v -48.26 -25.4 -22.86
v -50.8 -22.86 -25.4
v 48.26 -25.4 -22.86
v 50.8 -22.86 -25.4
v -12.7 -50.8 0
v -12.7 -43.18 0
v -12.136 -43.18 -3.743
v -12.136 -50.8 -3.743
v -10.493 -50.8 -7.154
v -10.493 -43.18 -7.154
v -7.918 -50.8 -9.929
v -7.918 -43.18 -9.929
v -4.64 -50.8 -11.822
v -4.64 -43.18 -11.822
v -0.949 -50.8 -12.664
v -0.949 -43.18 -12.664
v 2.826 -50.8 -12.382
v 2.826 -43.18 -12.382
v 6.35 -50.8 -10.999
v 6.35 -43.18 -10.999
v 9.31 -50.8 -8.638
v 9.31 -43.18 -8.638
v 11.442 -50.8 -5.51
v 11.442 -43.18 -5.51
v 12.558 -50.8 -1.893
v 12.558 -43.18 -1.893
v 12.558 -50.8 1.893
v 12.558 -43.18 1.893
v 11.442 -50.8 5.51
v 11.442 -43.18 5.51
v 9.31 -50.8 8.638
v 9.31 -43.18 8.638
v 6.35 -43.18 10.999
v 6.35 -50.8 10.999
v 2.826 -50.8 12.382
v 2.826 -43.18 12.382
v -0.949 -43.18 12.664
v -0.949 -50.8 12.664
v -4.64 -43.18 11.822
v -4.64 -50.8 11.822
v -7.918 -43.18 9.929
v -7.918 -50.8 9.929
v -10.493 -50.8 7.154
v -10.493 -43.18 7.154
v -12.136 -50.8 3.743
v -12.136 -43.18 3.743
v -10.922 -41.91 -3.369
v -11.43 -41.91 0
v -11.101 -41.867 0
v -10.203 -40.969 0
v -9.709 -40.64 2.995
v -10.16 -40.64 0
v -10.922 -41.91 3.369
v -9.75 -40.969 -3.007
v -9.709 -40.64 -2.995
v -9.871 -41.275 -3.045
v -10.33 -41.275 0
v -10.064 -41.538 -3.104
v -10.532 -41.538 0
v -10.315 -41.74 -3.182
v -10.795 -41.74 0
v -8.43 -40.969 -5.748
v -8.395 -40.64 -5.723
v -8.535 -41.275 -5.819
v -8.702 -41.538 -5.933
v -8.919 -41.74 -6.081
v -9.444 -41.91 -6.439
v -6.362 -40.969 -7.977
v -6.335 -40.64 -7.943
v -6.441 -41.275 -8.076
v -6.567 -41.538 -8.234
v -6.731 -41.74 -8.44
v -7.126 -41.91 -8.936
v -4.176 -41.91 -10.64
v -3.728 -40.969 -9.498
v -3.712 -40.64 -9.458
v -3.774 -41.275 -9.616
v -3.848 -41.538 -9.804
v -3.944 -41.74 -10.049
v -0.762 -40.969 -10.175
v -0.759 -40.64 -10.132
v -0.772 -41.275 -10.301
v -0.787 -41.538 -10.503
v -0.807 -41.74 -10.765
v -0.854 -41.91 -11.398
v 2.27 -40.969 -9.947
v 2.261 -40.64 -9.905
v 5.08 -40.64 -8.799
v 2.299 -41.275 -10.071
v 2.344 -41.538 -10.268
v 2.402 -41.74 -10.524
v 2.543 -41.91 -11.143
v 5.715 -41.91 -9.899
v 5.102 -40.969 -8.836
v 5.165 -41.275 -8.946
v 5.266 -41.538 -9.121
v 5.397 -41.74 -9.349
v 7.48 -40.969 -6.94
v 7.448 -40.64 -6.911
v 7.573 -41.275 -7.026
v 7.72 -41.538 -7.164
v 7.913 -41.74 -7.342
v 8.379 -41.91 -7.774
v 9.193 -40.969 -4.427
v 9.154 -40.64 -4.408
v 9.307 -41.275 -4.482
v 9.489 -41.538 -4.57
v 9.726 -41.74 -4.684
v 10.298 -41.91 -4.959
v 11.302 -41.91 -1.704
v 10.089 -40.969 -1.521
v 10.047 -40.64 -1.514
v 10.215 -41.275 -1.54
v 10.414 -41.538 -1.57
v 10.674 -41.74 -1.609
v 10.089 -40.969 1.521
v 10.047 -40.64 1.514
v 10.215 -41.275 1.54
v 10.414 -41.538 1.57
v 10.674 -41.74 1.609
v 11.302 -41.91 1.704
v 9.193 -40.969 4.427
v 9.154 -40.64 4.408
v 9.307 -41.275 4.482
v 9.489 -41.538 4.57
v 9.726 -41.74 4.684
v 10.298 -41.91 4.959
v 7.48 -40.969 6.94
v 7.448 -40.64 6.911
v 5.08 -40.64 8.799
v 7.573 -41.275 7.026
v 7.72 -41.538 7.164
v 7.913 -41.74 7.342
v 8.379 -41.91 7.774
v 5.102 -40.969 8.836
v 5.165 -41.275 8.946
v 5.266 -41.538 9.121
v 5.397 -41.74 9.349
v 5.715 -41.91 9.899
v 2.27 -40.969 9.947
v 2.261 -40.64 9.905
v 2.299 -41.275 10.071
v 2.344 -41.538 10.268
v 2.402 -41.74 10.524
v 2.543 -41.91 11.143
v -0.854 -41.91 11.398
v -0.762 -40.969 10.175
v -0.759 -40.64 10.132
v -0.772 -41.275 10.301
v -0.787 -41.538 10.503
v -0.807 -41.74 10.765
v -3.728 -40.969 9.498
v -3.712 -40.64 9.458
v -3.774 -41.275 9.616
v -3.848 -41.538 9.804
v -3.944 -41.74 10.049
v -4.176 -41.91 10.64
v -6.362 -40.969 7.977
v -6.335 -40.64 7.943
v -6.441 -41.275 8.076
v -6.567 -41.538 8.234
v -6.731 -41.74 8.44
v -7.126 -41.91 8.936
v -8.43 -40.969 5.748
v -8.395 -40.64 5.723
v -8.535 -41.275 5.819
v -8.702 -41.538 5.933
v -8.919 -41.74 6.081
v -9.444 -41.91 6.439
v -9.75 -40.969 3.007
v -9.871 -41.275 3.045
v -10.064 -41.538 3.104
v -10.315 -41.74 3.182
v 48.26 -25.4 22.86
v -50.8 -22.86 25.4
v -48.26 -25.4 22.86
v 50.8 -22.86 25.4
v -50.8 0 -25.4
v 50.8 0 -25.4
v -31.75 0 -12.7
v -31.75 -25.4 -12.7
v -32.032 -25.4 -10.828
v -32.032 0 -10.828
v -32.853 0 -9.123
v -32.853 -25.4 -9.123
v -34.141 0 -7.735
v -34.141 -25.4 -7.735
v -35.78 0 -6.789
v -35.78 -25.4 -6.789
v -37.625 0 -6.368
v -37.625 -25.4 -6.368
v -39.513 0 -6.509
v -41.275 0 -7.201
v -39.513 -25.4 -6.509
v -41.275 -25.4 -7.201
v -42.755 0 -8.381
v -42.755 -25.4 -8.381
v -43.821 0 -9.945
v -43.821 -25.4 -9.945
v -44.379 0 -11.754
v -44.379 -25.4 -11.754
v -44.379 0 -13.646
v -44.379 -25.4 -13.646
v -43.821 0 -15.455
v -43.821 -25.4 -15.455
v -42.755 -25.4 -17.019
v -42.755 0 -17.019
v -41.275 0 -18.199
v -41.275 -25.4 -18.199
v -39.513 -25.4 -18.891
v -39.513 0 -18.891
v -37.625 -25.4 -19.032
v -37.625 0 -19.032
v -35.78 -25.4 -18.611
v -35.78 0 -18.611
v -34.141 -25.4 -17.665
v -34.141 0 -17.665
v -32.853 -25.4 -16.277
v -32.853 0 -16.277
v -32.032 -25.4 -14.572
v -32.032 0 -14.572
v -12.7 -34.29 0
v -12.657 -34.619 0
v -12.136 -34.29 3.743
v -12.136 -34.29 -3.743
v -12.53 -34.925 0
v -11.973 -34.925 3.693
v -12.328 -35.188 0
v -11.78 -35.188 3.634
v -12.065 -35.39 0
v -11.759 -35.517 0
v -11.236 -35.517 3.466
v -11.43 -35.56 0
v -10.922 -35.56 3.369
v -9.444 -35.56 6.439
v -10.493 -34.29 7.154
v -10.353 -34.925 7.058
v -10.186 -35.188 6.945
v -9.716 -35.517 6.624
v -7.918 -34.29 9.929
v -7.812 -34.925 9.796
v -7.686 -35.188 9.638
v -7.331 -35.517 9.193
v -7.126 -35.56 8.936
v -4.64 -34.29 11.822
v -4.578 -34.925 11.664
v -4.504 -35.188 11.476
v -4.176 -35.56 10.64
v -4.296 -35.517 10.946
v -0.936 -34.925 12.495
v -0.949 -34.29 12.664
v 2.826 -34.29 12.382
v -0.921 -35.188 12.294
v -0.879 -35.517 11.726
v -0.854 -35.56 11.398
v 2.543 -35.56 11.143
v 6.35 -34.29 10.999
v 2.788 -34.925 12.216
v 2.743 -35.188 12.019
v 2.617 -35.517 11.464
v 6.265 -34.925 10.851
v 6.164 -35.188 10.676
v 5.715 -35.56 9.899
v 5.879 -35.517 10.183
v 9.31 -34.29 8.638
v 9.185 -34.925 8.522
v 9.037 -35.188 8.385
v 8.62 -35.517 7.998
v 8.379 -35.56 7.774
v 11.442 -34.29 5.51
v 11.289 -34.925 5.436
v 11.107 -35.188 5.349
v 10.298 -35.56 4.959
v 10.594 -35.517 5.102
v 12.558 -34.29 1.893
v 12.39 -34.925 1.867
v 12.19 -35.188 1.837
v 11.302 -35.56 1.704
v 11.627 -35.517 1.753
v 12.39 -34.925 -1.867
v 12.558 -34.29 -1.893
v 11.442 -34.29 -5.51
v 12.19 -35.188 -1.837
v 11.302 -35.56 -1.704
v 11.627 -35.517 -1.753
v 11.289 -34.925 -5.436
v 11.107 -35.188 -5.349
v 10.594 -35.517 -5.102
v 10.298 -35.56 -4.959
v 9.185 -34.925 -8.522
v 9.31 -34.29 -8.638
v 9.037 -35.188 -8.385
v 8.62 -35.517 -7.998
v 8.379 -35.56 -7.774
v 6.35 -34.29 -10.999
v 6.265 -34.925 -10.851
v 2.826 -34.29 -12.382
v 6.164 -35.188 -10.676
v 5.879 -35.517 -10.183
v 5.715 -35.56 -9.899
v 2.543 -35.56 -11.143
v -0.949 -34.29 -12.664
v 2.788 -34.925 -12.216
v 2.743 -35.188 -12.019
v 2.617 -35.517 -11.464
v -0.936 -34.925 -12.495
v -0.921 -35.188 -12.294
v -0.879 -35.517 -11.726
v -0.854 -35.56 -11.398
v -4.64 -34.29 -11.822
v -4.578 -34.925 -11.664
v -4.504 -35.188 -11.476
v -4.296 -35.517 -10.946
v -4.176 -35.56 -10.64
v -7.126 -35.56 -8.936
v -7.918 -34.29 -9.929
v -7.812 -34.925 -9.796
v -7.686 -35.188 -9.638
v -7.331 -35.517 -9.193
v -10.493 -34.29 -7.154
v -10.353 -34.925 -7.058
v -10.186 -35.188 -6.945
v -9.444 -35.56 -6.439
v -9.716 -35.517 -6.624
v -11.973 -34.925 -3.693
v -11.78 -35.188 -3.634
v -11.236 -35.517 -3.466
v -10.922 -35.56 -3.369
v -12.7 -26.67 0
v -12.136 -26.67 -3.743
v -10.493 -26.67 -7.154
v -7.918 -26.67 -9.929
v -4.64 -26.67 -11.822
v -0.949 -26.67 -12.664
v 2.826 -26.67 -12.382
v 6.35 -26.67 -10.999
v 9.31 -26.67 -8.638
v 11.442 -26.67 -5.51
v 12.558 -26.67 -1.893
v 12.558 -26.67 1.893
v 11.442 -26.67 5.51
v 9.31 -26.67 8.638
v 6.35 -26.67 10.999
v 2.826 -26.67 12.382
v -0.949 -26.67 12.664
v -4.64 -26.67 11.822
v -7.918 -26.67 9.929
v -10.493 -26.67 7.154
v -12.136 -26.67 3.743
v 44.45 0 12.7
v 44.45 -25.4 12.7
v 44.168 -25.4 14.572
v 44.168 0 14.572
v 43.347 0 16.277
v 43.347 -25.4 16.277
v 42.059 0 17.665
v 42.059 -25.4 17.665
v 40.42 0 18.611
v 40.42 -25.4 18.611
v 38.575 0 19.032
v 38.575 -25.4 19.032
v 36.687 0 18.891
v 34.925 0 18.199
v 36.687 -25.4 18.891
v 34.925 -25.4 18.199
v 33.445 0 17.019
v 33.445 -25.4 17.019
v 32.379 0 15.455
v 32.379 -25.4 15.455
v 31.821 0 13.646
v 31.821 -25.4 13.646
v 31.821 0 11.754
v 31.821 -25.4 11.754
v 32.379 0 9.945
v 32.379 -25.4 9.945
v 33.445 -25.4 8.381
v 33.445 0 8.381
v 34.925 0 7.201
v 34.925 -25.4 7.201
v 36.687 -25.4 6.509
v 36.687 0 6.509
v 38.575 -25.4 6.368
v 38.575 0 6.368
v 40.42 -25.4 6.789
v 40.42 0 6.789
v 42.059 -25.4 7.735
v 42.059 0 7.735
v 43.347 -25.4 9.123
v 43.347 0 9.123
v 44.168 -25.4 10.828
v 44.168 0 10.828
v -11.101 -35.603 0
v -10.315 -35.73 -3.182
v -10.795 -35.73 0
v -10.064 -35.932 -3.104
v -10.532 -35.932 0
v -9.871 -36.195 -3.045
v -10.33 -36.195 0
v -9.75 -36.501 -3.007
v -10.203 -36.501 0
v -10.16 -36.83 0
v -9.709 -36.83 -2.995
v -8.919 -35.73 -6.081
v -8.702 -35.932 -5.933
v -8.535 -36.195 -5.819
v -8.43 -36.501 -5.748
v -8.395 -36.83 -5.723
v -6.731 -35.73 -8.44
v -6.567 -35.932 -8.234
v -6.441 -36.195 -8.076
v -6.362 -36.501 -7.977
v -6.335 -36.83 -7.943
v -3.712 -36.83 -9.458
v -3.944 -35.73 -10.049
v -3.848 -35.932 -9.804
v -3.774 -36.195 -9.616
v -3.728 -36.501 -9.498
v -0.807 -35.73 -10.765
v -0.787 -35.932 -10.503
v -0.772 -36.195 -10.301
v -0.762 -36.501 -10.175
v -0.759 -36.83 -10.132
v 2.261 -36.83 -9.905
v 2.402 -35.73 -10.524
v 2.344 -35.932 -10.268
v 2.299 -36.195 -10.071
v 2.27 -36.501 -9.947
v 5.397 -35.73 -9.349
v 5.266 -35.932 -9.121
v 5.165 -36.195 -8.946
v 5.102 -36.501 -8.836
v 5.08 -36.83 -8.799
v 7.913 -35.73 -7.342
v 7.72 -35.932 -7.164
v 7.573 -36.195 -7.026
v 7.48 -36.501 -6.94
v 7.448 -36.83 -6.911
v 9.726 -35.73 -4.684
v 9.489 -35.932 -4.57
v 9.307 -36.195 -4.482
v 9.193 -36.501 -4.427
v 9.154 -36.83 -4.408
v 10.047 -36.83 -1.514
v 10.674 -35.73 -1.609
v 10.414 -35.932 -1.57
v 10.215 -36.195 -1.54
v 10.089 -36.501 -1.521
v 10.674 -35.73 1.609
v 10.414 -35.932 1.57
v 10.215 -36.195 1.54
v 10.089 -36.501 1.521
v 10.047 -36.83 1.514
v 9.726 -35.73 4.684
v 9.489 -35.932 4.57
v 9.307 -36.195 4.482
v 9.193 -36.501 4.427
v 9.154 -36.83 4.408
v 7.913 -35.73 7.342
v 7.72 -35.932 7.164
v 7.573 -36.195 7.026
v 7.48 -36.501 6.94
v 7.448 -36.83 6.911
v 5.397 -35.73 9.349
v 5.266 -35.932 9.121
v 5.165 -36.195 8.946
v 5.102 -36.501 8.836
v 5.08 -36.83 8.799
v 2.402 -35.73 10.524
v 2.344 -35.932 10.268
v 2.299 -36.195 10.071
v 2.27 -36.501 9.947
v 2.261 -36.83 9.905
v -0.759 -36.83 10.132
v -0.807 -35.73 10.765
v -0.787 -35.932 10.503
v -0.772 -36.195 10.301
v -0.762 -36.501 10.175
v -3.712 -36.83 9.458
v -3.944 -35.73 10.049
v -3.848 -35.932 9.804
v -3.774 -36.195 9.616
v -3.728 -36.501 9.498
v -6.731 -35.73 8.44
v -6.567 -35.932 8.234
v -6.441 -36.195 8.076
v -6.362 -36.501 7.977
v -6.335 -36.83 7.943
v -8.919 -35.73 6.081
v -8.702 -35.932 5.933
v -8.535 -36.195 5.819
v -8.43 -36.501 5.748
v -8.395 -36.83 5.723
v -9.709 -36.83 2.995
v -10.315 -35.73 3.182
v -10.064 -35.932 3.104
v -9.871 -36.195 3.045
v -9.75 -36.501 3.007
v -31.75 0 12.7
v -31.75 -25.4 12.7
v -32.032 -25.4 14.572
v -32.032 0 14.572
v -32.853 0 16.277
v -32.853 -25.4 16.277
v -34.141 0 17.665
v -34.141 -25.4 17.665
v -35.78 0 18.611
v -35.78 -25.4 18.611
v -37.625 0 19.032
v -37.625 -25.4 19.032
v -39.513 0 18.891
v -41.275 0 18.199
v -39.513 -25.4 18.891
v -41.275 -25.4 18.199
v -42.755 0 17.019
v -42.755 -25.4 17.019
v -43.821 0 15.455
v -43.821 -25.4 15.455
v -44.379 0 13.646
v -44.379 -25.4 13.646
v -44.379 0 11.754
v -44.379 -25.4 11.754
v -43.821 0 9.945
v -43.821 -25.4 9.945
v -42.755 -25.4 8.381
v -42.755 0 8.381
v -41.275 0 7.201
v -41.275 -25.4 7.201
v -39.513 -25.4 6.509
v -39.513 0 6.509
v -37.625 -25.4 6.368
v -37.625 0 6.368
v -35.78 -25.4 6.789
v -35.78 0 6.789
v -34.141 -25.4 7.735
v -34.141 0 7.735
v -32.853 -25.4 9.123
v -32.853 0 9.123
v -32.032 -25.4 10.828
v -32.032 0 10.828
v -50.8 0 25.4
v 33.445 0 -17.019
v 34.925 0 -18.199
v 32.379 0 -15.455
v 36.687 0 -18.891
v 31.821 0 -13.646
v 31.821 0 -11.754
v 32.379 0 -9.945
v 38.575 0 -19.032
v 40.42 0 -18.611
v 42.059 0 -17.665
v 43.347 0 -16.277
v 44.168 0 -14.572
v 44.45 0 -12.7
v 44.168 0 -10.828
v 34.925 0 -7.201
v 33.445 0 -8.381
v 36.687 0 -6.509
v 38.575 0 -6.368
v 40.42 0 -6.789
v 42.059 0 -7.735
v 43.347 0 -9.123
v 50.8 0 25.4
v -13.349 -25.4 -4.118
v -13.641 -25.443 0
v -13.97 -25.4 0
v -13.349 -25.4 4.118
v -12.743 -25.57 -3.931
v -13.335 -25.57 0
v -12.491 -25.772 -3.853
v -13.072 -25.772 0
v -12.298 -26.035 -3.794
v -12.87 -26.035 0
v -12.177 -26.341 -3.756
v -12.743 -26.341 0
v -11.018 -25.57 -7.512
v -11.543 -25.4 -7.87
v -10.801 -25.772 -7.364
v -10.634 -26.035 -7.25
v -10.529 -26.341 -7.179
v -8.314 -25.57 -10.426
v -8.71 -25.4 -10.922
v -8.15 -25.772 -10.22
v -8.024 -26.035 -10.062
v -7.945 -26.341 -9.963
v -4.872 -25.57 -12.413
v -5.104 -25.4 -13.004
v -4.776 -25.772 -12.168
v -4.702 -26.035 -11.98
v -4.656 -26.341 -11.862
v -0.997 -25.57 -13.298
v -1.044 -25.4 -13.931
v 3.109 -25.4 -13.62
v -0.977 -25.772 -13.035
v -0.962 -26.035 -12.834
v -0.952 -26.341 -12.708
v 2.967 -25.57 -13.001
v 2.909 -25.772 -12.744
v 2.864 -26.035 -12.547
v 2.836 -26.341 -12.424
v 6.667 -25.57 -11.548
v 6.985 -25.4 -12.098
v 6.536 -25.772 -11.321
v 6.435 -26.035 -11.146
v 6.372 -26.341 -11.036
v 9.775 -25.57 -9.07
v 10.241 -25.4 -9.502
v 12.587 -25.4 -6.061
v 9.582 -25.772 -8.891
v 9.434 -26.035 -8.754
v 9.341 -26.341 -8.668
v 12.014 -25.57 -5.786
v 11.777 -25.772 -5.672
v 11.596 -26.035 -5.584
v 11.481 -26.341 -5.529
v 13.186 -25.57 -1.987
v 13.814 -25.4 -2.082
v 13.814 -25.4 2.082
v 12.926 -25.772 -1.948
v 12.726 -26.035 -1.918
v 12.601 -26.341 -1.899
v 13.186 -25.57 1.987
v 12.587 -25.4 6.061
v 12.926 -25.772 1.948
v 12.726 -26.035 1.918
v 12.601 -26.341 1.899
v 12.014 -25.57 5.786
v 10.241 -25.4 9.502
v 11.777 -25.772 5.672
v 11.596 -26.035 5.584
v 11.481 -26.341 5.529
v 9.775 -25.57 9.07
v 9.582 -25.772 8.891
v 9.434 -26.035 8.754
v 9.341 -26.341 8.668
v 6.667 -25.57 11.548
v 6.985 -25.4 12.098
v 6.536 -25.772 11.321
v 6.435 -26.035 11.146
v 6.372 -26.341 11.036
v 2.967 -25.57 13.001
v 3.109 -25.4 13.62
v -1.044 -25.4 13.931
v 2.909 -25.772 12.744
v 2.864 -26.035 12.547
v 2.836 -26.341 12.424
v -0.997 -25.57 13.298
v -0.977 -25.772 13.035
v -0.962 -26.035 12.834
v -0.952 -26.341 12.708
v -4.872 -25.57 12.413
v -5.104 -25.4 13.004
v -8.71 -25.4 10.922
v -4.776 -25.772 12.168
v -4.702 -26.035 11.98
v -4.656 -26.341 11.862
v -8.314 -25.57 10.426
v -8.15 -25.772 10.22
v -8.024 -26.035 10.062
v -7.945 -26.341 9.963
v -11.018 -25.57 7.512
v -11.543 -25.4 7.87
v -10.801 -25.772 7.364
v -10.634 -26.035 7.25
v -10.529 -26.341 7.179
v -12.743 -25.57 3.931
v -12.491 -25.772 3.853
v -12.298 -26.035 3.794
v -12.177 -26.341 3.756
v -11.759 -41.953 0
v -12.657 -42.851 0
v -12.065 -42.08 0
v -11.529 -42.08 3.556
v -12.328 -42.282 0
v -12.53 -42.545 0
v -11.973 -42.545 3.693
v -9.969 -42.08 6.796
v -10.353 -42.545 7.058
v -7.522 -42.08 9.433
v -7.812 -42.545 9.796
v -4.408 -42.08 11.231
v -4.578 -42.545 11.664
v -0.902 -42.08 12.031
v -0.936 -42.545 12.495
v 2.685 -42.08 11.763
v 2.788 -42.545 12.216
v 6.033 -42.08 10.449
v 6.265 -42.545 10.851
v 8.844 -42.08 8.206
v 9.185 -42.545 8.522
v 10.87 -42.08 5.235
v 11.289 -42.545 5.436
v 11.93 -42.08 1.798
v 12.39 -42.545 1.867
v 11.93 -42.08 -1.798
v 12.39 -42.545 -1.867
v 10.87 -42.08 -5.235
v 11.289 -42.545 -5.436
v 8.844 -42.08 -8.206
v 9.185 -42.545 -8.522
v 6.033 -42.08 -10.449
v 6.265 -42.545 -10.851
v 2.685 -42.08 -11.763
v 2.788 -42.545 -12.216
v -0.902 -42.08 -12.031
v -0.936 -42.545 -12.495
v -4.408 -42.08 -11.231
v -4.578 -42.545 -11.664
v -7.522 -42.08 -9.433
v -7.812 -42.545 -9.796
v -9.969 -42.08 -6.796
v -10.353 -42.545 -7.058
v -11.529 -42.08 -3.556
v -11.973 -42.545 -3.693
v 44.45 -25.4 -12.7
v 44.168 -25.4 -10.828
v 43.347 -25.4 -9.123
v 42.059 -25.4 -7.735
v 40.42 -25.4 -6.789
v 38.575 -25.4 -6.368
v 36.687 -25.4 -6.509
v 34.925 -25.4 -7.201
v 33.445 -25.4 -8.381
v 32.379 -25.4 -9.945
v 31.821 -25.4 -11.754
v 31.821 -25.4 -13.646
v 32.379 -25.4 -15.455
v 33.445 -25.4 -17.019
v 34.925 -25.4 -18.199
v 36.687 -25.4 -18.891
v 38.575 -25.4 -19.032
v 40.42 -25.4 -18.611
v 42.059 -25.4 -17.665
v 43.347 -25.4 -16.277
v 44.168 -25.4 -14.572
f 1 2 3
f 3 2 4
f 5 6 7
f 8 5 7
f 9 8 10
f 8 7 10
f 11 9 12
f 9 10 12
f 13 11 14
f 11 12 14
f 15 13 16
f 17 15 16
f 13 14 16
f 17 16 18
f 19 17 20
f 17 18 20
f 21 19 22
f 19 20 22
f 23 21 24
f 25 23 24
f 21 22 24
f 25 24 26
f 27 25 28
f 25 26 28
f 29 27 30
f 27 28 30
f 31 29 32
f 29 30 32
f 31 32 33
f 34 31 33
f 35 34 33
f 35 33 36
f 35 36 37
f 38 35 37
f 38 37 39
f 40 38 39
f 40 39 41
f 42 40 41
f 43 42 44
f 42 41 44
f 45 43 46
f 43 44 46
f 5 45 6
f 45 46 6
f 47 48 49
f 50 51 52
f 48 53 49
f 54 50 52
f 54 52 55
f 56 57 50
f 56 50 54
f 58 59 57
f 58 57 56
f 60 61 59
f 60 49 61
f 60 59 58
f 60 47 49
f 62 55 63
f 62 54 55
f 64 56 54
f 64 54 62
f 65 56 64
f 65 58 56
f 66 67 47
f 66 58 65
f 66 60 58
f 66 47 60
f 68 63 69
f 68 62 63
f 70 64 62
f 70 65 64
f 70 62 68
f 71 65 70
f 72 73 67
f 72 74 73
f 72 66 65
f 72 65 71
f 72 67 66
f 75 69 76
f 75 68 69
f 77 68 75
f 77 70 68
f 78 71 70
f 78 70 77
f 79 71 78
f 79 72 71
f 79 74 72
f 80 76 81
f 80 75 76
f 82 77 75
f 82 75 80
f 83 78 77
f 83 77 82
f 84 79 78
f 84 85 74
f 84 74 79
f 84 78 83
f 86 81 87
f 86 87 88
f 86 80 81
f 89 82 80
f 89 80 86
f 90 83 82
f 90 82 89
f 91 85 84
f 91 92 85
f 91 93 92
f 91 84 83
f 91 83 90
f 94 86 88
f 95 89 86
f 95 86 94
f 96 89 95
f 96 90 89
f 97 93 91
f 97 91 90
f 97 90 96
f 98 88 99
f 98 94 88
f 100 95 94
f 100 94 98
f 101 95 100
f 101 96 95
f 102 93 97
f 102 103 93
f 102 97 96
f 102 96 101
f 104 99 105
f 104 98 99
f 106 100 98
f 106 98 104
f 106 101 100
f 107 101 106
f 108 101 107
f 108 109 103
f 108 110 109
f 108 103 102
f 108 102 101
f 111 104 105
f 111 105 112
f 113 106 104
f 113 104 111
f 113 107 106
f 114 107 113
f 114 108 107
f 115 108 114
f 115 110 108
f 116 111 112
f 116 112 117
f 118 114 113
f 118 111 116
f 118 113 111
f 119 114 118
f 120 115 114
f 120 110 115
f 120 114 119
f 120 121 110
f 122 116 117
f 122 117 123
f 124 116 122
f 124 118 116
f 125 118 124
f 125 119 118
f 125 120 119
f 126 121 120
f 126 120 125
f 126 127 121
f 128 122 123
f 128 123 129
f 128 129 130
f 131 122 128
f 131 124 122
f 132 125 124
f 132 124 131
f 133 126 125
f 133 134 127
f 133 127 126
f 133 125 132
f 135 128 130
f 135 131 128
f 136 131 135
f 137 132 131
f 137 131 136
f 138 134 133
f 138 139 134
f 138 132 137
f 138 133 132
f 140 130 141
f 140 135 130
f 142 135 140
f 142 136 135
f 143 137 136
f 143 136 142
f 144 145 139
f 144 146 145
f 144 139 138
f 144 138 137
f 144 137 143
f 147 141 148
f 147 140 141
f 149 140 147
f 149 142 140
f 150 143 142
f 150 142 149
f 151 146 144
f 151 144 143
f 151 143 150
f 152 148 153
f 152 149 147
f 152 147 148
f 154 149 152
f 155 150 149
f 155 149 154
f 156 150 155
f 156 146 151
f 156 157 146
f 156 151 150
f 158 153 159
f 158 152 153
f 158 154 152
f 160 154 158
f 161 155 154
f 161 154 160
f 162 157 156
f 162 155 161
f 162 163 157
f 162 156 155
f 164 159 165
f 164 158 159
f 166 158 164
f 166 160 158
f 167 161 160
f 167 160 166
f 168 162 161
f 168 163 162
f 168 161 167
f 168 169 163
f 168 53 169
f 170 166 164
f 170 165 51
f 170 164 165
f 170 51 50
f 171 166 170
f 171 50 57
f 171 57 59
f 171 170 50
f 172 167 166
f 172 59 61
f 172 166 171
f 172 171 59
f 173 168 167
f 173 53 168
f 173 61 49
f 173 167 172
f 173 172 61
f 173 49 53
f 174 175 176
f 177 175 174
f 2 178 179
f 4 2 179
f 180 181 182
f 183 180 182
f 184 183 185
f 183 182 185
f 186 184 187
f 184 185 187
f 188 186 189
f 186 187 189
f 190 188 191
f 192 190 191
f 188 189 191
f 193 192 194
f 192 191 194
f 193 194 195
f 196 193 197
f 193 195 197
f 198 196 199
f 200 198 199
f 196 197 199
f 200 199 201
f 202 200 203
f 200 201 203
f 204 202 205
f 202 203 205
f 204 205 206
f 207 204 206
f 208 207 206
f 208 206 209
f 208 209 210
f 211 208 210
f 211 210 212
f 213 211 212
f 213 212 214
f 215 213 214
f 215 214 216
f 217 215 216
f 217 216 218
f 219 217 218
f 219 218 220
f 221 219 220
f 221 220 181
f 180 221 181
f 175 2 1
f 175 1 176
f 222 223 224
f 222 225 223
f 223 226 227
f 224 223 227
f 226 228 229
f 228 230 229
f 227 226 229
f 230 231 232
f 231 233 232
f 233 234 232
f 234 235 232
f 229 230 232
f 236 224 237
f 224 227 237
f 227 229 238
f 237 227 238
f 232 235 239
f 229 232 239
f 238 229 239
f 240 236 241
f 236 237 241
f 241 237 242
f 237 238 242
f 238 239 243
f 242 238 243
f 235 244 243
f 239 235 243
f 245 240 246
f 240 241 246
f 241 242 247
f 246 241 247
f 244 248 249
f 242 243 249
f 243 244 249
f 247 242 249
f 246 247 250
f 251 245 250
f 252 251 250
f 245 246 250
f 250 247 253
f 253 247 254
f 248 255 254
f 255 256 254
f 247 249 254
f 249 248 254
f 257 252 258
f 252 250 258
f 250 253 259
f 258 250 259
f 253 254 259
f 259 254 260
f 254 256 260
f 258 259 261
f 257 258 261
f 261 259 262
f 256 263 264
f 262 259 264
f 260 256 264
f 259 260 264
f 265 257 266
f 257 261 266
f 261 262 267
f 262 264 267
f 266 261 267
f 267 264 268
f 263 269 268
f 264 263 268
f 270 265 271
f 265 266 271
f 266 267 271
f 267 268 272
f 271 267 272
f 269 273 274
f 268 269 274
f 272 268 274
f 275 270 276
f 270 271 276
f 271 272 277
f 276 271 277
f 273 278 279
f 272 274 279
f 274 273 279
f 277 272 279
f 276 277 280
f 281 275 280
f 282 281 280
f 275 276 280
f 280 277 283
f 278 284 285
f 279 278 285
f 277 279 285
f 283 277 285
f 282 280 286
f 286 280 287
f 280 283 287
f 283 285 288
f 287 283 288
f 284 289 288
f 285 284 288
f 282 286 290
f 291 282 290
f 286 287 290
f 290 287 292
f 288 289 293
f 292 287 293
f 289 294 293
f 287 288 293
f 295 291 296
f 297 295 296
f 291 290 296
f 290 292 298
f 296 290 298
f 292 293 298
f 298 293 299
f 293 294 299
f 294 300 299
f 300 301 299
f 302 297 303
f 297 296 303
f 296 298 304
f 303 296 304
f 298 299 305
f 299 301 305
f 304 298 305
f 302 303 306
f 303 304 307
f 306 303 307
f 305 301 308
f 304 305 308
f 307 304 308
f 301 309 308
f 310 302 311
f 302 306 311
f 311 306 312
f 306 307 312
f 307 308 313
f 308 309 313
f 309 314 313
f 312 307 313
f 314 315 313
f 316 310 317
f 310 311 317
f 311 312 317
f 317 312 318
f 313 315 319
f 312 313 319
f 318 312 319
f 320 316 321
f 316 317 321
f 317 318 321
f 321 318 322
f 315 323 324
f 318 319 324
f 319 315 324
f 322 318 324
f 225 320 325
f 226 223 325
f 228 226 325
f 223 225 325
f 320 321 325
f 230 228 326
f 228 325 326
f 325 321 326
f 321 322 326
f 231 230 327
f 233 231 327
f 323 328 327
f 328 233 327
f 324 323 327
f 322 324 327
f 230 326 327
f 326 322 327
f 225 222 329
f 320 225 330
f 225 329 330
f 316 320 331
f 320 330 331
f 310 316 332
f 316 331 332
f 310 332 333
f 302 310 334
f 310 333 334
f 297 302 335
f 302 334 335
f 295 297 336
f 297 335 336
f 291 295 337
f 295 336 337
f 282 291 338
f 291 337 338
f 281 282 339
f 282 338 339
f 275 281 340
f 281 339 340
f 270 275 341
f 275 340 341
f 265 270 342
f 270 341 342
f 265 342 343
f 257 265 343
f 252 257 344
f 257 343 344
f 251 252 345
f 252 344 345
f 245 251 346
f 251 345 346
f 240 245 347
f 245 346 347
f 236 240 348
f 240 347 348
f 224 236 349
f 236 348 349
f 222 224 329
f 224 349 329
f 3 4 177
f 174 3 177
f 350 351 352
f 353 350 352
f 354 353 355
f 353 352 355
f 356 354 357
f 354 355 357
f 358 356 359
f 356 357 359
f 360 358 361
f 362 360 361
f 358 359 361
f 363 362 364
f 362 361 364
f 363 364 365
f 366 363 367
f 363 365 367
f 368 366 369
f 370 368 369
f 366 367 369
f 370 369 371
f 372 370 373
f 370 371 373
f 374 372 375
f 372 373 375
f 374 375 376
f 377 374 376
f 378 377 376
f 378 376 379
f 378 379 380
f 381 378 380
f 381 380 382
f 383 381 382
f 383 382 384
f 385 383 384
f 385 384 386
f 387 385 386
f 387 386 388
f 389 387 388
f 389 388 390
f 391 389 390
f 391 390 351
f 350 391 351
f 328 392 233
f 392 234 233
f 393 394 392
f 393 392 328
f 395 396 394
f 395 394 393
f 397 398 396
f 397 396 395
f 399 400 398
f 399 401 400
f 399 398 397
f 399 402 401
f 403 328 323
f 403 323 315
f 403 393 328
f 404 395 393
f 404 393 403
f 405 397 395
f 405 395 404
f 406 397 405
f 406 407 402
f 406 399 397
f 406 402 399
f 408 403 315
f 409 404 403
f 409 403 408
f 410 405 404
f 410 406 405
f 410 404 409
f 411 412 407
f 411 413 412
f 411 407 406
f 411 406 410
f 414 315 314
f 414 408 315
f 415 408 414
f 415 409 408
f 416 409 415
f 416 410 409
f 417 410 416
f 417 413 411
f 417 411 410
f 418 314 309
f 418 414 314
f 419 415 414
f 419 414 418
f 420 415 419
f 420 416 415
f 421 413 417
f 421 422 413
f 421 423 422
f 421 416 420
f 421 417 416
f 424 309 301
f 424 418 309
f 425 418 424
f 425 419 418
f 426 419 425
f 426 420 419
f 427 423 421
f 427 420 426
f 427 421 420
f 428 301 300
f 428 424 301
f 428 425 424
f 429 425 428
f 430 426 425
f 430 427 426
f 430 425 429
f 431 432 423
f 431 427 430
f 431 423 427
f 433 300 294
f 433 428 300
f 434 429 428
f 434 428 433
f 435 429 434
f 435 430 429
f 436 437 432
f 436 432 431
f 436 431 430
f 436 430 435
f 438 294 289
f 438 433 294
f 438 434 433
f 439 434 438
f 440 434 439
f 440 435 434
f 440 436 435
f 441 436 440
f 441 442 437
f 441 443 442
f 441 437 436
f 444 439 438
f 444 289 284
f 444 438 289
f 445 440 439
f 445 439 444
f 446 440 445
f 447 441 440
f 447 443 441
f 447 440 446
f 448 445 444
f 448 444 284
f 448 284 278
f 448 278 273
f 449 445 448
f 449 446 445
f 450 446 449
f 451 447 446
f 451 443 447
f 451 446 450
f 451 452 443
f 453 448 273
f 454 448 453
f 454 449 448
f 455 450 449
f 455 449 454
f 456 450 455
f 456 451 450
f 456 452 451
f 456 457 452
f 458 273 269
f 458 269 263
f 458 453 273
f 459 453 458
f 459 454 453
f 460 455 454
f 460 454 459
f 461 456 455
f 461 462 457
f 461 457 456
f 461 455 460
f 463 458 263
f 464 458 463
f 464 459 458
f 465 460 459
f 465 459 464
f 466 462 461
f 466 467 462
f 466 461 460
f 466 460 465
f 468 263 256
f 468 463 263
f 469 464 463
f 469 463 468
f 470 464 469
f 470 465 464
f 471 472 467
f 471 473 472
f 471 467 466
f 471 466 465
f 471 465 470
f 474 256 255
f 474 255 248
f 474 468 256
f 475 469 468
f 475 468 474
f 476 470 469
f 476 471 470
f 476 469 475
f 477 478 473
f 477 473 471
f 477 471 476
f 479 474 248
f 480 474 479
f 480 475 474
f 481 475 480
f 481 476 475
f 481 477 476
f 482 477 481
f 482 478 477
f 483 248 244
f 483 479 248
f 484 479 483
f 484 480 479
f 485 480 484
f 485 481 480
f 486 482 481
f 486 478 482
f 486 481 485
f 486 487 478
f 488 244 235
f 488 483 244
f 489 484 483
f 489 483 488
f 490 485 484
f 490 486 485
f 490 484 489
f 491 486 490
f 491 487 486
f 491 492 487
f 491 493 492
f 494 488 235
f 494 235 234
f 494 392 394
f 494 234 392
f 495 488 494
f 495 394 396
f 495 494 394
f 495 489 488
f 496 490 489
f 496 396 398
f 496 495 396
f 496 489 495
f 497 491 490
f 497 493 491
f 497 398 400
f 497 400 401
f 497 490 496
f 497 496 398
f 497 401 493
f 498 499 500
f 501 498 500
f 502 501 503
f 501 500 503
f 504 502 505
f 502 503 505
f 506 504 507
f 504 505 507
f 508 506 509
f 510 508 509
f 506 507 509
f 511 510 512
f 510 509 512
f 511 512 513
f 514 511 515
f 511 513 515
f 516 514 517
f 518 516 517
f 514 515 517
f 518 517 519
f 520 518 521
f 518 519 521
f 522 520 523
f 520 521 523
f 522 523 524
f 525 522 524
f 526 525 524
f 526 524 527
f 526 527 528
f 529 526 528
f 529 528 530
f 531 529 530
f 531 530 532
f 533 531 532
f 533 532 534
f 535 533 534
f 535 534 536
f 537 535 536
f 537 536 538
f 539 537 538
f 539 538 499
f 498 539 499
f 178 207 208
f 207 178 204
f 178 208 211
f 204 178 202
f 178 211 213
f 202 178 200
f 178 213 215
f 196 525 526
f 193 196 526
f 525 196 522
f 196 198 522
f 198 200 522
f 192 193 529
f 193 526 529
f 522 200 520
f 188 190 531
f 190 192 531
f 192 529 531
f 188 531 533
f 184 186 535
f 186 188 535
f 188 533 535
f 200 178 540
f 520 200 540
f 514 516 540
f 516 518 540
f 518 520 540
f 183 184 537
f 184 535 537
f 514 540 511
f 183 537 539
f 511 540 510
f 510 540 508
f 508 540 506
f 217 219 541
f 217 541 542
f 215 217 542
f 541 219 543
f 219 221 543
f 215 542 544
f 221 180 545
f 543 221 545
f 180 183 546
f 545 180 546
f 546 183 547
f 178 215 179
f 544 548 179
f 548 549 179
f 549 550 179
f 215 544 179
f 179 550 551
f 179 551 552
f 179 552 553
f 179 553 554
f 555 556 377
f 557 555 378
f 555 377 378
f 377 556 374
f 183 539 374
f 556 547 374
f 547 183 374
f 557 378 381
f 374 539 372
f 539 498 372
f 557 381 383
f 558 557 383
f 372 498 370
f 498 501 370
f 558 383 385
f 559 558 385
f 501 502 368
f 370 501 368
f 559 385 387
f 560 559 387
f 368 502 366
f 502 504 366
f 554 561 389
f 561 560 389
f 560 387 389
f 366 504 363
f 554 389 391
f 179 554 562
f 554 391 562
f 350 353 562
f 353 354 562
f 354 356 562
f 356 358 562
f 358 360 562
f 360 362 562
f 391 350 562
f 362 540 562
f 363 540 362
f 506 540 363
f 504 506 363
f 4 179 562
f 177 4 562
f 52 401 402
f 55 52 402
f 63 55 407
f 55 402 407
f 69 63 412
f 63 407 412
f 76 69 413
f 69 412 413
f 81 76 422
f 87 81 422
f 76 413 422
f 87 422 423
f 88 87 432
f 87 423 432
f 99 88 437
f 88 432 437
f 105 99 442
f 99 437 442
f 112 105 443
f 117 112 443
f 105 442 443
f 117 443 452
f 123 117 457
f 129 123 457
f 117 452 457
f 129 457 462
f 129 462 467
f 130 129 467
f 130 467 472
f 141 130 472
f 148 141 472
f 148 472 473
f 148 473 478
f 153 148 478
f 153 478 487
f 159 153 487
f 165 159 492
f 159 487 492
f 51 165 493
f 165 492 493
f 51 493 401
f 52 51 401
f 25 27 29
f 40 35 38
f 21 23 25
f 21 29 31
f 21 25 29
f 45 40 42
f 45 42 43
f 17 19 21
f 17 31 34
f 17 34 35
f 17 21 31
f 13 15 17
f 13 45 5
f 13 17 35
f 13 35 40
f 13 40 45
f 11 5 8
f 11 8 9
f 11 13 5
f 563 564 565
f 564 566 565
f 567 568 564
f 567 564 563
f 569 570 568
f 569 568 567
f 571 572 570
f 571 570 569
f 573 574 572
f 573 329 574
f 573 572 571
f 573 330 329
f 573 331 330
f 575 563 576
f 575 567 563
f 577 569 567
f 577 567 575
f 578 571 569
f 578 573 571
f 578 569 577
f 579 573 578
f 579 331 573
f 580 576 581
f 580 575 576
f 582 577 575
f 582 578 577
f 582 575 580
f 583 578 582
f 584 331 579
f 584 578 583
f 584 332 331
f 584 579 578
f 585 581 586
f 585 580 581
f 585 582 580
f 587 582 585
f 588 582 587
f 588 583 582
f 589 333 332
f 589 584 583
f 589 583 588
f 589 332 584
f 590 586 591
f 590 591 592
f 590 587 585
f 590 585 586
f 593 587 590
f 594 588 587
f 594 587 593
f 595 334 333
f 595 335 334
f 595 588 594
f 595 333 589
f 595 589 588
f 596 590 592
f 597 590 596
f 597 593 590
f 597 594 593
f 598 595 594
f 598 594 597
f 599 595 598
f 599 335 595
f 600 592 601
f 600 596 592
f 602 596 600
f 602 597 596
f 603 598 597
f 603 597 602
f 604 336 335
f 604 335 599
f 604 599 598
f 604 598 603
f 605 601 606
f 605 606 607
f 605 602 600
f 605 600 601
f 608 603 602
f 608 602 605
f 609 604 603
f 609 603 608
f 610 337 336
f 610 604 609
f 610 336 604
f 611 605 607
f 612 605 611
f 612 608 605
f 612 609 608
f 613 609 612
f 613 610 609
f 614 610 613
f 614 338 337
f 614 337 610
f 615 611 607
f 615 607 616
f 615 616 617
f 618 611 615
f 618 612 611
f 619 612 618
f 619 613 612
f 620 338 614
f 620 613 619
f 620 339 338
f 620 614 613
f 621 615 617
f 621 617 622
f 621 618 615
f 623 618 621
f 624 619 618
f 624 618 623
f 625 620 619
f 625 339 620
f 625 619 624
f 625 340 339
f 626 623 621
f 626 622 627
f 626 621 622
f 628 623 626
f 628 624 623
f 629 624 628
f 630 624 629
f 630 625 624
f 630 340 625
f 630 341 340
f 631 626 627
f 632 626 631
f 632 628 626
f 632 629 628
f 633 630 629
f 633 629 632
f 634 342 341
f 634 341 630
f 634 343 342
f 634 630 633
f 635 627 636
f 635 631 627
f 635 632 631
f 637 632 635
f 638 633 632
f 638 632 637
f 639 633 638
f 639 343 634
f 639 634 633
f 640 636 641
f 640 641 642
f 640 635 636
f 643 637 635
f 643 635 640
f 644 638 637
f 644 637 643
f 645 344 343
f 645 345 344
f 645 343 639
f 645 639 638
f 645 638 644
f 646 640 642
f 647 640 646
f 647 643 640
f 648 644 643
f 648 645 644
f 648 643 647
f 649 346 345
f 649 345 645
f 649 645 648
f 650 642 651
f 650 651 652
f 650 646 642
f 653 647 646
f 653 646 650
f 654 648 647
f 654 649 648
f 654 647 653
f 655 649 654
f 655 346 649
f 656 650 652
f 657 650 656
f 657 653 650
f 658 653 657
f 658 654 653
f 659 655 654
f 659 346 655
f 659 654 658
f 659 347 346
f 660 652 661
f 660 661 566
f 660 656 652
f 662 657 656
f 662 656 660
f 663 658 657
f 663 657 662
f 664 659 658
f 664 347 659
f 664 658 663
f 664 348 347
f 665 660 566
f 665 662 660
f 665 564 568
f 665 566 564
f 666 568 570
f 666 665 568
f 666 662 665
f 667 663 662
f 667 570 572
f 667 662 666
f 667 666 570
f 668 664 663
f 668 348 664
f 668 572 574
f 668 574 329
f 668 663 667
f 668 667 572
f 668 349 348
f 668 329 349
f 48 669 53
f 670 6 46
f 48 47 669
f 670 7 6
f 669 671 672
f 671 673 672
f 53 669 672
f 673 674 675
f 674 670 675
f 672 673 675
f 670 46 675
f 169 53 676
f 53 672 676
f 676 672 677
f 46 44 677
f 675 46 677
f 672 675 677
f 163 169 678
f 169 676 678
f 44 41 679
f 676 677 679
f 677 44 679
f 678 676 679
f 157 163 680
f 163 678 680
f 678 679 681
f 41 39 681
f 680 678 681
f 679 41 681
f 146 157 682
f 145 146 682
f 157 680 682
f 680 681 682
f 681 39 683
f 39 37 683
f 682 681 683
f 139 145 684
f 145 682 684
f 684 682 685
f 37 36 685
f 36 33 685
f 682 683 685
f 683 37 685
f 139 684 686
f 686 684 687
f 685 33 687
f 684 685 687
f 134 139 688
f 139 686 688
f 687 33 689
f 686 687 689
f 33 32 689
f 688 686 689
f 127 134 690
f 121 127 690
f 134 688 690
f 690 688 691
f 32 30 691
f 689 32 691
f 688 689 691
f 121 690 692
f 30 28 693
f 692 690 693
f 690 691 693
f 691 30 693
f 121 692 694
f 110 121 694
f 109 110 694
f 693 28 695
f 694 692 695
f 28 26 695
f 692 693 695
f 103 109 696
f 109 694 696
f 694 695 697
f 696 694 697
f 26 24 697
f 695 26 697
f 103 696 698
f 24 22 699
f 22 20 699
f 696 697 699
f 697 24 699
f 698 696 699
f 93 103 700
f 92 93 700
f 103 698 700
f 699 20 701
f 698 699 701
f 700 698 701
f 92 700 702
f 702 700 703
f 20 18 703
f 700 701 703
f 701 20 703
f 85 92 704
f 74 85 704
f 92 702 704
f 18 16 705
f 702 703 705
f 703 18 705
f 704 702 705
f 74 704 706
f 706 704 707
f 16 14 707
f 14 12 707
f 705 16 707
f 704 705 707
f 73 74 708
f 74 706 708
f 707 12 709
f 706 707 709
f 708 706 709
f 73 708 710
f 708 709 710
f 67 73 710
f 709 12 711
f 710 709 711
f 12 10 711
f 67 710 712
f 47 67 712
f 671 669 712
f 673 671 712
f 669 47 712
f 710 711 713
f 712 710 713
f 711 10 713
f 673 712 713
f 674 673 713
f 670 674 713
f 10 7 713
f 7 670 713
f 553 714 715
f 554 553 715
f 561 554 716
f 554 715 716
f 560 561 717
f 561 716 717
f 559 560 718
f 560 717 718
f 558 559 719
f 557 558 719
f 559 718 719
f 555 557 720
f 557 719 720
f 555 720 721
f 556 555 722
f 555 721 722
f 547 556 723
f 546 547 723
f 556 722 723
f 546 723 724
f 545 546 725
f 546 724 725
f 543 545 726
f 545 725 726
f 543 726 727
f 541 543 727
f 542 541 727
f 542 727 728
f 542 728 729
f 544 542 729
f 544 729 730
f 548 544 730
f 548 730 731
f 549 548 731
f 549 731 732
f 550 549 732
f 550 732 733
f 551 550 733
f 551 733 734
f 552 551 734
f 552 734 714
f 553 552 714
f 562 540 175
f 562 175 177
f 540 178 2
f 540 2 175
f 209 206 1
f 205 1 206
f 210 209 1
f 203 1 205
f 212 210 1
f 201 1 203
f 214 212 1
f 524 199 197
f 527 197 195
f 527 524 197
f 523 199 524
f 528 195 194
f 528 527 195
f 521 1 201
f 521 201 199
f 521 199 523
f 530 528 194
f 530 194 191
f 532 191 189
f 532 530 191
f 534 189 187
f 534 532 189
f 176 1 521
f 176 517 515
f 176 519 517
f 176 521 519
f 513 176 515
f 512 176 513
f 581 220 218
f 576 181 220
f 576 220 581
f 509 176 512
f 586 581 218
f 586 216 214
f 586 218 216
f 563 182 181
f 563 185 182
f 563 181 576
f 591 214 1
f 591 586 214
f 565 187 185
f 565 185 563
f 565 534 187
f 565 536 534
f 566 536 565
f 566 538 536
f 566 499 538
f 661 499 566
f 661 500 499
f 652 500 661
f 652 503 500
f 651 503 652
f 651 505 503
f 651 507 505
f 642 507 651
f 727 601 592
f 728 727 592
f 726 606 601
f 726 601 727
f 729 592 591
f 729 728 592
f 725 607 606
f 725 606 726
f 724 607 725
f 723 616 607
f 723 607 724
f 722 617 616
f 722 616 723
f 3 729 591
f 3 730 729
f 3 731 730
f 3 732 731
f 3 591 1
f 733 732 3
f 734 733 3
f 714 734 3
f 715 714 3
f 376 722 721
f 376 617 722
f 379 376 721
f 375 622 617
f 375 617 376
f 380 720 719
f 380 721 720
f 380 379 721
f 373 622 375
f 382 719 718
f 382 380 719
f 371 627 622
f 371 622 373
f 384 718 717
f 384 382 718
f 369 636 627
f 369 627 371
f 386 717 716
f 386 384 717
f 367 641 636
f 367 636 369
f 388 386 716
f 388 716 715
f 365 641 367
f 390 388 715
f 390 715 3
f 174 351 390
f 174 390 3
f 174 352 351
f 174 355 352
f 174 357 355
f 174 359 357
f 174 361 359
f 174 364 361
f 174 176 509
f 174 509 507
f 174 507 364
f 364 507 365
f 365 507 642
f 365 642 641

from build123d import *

# Parameters (mm, degrees)
F0_W     = 101.6
F0_H     = 50.8
F1_DEPTH = 25.4
F2_R     = 6.35
F3_DEPTH = 25.401
F4_W     = 12.7
F4_H     = 25.4
F6_W     = 6.9762246056
F6_H     = 6.35
F8_R     = 1.26999
F9_SIZE  = 2.54


# Not quite as in the source:
# - a fillet or chamfer is up to 0.001 mm smaller than in the source, because OpenCascade refuses the exact size


with BuildPart() as f1:
    # F0 (on Front) → F1 (new body)
    with BuildSketch(Plane.XZ):
        Rectangle(F0_W, F0_H)
    extrude(amount=F1_DEPTH)

    # F2 (on face) → F3 (cut, through all)
    with BuildSketch(Plane.XZ.offset(25.4)):
        with Locations((-38.1, 12.7)):
            Circle(F2_R)
        with Locations((-38.1, -12.7)):
            Circle(F2_R)
        with Locations((38.1, -12.7)):
            Circle(F2_R)
        with Locations((38.1, 12.7)):
            Circle(F2_R)
    extrude(amount=-F3_DEPTH, mode=Mode.SUBTRACT)

    # F4 (on Top) → F5 (revolve)
    with BuildSketch(Plane.XY):
        with Locations((-6.35, -38.1)):
            Rectangle(F4_W, F4_H)
    revolve(axis=Axis((0, -38.1, 0), (0, -1, 0)))

    # F6 (on Top) → F7 (revolve, cut)
    with BuildSketch(Plane.XY):
        with Locations((-13.6481123028, -38.735)):
            Rectangle(F6_W, F6_H)
    revolve(axis=Axis((0, -32.9395644367, 0), (0, -1, 0)), mode=Mode.SUBTRACT)

    # F8 (radius 1.27 in the source; OpenCascade refuses exactly that, so slightly less here)
    f8_edges = [f1.edges().sort_by_distance(p)[0] for p in [
        (12.7, -25.4, 0),
        (10.16, -41.91, 0),
        (10.16, -35.56, 0),
        (12.7, -41.91, 0),
        (12.7, -35.56, 0),
    ]]
    fillet(f8_edges, radius=F8_R)

    # F9
    f9_edges = [f1.edges().sort_by_distance(p)[0] for p in [
        (0, -25.4, -25.4),
        (-50.8, -25.4, 0),
        (0, -25.4, 25.4),
        (50.8, -25.4, 0),
    ]]
    chamfer(f9_edges, length=F9_SIZE)


solid = f1.part
